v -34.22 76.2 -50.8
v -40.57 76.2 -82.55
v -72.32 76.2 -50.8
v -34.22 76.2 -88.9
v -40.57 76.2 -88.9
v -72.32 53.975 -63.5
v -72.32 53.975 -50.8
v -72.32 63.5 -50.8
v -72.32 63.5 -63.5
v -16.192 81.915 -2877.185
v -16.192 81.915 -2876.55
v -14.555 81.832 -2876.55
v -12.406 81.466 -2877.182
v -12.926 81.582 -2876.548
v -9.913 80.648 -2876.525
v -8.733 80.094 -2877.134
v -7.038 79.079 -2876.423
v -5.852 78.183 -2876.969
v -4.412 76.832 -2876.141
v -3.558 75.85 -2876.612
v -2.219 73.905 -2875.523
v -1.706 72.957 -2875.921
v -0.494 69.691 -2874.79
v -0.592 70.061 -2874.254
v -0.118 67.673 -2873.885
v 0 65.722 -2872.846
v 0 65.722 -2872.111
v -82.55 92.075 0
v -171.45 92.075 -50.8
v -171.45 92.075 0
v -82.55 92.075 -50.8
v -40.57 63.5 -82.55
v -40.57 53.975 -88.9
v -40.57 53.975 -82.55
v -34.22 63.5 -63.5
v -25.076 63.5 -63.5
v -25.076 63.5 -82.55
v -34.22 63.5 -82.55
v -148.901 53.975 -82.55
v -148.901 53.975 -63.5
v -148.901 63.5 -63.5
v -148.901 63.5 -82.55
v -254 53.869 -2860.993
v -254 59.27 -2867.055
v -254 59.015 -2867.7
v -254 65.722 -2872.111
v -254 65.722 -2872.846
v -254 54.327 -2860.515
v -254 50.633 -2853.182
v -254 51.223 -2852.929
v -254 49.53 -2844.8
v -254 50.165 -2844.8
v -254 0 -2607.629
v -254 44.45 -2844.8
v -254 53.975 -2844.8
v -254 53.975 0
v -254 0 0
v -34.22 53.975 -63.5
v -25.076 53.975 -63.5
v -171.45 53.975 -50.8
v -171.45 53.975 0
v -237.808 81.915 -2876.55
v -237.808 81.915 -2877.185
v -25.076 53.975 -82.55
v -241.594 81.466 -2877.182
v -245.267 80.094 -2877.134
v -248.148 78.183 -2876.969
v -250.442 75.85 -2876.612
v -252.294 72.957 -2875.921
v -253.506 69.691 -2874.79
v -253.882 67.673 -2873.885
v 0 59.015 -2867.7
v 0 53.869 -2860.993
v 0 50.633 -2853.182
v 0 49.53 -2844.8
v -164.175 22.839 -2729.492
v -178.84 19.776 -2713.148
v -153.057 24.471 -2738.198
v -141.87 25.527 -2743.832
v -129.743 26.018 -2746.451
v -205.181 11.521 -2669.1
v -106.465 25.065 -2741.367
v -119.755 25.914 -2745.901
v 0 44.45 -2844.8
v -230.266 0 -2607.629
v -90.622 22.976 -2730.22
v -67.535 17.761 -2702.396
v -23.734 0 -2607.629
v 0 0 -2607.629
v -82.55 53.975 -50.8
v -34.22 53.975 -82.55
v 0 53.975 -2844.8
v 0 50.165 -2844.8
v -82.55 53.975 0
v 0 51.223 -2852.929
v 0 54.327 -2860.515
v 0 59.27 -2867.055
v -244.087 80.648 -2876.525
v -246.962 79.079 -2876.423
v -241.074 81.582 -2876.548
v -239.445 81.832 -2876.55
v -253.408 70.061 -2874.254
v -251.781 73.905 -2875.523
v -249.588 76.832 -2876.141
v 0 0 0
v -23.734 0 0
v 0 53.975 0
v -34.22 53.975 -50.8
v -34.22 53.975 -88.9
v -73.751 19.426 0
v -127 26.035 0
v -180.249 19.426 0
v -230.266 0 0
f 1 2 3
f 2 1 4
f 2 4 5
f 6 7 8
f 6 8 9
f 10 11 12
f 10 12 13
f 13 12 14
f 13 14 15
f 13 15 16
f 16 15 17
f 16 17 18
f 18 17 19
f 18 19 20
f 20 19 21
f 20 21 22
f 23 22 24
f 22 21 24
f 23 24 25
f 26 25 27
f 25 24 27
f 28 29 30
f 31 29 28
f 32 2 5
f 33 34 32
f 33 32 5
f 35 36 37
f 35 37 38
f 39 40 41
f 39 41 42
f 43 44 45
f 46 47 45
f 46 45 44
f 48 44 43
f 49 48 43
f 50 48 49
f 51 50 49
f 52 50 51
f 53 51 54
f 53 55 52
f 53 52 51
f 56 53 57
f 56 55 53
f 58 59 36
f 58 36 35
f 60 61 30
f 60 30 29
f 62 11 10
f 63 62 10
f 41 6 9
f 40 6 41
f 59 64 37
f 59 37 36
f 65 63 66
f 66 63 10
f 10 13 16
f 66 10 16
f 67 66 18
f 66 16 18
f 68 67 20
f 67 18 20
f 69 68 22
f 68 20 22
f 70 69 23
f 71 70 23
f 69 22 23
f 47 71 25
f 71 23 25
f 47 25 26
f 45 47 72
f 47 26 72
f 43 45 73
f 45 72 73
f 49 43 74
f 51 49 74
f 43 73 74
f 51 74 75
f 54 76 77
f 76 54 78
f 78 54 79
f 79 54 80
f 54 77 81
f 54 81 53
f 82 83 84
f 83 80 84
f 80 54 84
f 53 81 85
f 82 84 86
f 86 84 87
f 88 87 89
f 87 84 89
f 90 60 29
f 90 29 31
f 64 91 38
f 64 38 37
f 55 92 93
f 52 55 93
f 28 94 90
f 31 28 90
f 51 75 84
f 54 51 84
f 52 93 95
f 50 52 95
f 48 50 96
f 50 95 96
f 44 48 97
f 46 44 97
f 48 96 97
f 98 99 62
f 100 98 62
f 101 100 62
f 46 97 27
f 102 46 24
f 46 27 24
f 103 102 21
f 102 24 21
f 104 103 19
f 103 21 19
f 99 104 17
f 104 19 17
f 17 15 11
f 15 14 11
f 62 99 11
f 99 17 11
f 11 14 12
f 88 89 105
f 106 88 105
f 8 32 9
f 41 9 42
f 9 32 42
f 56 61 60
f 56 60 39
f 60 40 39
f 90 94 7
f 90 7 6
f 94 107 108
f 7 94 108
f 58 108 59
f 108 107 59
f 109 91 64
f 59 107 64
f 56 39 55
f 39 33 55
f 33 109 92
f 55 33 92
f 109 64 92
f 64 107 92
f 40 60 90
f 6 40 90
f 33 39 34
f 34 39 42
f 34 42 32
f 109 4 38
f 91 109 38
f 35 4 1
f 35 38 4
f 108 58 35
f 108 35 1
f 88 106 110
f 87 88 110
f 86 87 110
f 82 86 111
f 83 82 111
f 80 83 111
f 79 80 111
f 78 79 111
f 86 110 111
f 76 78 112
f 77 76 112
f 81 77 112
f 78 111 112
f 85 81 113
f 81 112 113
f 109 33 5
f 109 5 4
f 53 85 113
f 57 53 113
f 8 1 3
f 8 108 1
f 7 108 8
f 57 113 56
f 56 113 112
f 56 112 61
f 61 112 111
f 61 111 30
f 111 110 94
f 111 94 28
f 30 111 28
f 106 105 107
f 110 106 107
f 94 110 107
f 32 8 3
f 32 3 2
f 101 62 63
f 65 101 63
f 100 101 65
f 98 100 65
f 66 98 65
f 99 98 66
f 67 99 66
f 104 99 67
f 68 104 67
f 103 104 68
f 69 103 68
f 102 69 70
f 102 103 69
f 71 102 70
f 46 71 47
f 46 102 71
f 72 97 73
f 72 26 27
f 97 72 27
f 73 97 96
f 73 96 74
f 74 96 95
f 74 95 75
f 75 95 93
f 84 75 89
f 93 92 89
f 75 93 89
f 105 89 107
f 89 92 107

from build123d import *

# Parameters (mm, degrees)
BOSS_EXTRUDE1_DEPTH = 254
CUT_EXTRUDE1_DEPTH  = 2878.185
SKETCH6_R           = 217.8177
CUT_EXTRUDE2_DEPTH  = 2878.1850001
SKETCH7_W           = 88.9
SKETCH7_H           = 50.8
BOSS_EXTRUDE2_DEPTH = 38.1
BOSS_EXTRUDE3_DEPTH = 9.525
BOSS_EXTRUDE4_DEPTH = 12.7


with BuildPart() as part:
    # Sketch3 → Boss-Extrude1 (new body)
    with BuildSketch(Plane(origin=(0, 0, 0), x_dir=(0, 0, -1), z_dir=(1, 0, 0))):
        with BuildLine():
            Line((2844.8, 44.45), (2607.629412658, 0))
            Line((2607.629412658, 0), (0, 0))
            Line((0, 0), (0, 53.975))
            Line((0, 53.975), (2844.8, 53.975))
            Line((2844.8, 53.975), (2844.8, 50.165))
            ThreePointArc((2844.8, 50.165), (2867.250640303, 59.464359697), (2876.55, 81.915))
            Line((2876.55, 81.915), (2877.185, 81.915))
            ThreePointArc((2877.185, 81.915), (2867.699653109, 59.015346891), (2844.8, 49.53))
            Line((2844.8, 49.53), (2844.8, 44.45))
        make_face()
    extrude(amount=-BOSS_EXTRUDE1_DEPTH)

    # Sketch5 → Cut-Extrude1 (cut, through all)
    with BuildSketch(Plane.XY):
        with BuildLine():
            Line((0, 65.7225), (0, 81.915))
            Line((0, 81.915), (-16.1925, 81.915))
            ThreePointArc((-16.1925, 81.915), (-4.742673446, 77.172326554), (0, 65.7225))
        make_face()
        with BuildLine():
            Line((-254, 65.7225), (-254, 81.915))
            Line((-254, 81.915), (-237.8075, 81.915))
            ThreePointArc((-237.8075, 81.915), (-249.257326554, 77.172326554), (-254, 65.7225))
        make_face()
    extrude(amount=-CUT_EXTRUDE1_DEPTH, mode=Mode.SUBTRACT)

    # Sketch6 → Cut-Extrude2 (cut, through all)
    with BuildSketch(Plane.XY):
        with Locations((-127, -191.7827)):
            Circle(SKETCH6_R)
    extrude(amount=-CUT_EXTRUDE2_DEPTH, mode=Mode.SUBTRACT)

    # Sketch7 → Boss-Extrude2 (add)
    with BuildSketch(Plane(origin=(0, 53.975, 0), x_dir=(1, 0, 0), z_dir=(0, 1, 0))):
        with Locations((-127, 25.4)):
            Rectangle(SKETCH7_W, SKETCH7_H)
    extrude(amount=BOSS_EXTRUDE2_DEPTH)

    # Sketch8 → Boss-Extrude3 (add)
    with BuildSketch(Plane(origin=(0, 53.975, 0), x_dir=(1, 0, 0), z_dir=(0, 1, 0))):
        Polygon((-34.219914215, 88.9), (-34.219914215, 82.55), (-25.075914215, 82.55), (-25.075914215, 63.5), (-34.219914215, 63.5), (-34.219914215, 50.8), (-72.319914215, 50.8), (-72.319914215, 63.5), (-148.900914215, 63.5), (-148.900914215, 82.55), (-40.569914215, 82.55), (-40.569914215, 88.9), align=None)
    extrude(amount=BOSS_EXTRUDE3_DEPTH)

    # Sketch9 → Boss-Extrude4 (add)
    with BuildSketch(Plane(origin=(0, 63.5, 0), x_dir=(1, 0, 0), z_dir=(0, 1, 0))):
        Polygon((-72.319914215, 50.8), (-40.569914215, 82.55), (-40.569914215, 88.9), (-34.219914215, 88.9), (-34.219914215, 50.8), align=None)
    extrude(amount=BOSS_EXTRUDE4_DEPTH)


solid = part.part
